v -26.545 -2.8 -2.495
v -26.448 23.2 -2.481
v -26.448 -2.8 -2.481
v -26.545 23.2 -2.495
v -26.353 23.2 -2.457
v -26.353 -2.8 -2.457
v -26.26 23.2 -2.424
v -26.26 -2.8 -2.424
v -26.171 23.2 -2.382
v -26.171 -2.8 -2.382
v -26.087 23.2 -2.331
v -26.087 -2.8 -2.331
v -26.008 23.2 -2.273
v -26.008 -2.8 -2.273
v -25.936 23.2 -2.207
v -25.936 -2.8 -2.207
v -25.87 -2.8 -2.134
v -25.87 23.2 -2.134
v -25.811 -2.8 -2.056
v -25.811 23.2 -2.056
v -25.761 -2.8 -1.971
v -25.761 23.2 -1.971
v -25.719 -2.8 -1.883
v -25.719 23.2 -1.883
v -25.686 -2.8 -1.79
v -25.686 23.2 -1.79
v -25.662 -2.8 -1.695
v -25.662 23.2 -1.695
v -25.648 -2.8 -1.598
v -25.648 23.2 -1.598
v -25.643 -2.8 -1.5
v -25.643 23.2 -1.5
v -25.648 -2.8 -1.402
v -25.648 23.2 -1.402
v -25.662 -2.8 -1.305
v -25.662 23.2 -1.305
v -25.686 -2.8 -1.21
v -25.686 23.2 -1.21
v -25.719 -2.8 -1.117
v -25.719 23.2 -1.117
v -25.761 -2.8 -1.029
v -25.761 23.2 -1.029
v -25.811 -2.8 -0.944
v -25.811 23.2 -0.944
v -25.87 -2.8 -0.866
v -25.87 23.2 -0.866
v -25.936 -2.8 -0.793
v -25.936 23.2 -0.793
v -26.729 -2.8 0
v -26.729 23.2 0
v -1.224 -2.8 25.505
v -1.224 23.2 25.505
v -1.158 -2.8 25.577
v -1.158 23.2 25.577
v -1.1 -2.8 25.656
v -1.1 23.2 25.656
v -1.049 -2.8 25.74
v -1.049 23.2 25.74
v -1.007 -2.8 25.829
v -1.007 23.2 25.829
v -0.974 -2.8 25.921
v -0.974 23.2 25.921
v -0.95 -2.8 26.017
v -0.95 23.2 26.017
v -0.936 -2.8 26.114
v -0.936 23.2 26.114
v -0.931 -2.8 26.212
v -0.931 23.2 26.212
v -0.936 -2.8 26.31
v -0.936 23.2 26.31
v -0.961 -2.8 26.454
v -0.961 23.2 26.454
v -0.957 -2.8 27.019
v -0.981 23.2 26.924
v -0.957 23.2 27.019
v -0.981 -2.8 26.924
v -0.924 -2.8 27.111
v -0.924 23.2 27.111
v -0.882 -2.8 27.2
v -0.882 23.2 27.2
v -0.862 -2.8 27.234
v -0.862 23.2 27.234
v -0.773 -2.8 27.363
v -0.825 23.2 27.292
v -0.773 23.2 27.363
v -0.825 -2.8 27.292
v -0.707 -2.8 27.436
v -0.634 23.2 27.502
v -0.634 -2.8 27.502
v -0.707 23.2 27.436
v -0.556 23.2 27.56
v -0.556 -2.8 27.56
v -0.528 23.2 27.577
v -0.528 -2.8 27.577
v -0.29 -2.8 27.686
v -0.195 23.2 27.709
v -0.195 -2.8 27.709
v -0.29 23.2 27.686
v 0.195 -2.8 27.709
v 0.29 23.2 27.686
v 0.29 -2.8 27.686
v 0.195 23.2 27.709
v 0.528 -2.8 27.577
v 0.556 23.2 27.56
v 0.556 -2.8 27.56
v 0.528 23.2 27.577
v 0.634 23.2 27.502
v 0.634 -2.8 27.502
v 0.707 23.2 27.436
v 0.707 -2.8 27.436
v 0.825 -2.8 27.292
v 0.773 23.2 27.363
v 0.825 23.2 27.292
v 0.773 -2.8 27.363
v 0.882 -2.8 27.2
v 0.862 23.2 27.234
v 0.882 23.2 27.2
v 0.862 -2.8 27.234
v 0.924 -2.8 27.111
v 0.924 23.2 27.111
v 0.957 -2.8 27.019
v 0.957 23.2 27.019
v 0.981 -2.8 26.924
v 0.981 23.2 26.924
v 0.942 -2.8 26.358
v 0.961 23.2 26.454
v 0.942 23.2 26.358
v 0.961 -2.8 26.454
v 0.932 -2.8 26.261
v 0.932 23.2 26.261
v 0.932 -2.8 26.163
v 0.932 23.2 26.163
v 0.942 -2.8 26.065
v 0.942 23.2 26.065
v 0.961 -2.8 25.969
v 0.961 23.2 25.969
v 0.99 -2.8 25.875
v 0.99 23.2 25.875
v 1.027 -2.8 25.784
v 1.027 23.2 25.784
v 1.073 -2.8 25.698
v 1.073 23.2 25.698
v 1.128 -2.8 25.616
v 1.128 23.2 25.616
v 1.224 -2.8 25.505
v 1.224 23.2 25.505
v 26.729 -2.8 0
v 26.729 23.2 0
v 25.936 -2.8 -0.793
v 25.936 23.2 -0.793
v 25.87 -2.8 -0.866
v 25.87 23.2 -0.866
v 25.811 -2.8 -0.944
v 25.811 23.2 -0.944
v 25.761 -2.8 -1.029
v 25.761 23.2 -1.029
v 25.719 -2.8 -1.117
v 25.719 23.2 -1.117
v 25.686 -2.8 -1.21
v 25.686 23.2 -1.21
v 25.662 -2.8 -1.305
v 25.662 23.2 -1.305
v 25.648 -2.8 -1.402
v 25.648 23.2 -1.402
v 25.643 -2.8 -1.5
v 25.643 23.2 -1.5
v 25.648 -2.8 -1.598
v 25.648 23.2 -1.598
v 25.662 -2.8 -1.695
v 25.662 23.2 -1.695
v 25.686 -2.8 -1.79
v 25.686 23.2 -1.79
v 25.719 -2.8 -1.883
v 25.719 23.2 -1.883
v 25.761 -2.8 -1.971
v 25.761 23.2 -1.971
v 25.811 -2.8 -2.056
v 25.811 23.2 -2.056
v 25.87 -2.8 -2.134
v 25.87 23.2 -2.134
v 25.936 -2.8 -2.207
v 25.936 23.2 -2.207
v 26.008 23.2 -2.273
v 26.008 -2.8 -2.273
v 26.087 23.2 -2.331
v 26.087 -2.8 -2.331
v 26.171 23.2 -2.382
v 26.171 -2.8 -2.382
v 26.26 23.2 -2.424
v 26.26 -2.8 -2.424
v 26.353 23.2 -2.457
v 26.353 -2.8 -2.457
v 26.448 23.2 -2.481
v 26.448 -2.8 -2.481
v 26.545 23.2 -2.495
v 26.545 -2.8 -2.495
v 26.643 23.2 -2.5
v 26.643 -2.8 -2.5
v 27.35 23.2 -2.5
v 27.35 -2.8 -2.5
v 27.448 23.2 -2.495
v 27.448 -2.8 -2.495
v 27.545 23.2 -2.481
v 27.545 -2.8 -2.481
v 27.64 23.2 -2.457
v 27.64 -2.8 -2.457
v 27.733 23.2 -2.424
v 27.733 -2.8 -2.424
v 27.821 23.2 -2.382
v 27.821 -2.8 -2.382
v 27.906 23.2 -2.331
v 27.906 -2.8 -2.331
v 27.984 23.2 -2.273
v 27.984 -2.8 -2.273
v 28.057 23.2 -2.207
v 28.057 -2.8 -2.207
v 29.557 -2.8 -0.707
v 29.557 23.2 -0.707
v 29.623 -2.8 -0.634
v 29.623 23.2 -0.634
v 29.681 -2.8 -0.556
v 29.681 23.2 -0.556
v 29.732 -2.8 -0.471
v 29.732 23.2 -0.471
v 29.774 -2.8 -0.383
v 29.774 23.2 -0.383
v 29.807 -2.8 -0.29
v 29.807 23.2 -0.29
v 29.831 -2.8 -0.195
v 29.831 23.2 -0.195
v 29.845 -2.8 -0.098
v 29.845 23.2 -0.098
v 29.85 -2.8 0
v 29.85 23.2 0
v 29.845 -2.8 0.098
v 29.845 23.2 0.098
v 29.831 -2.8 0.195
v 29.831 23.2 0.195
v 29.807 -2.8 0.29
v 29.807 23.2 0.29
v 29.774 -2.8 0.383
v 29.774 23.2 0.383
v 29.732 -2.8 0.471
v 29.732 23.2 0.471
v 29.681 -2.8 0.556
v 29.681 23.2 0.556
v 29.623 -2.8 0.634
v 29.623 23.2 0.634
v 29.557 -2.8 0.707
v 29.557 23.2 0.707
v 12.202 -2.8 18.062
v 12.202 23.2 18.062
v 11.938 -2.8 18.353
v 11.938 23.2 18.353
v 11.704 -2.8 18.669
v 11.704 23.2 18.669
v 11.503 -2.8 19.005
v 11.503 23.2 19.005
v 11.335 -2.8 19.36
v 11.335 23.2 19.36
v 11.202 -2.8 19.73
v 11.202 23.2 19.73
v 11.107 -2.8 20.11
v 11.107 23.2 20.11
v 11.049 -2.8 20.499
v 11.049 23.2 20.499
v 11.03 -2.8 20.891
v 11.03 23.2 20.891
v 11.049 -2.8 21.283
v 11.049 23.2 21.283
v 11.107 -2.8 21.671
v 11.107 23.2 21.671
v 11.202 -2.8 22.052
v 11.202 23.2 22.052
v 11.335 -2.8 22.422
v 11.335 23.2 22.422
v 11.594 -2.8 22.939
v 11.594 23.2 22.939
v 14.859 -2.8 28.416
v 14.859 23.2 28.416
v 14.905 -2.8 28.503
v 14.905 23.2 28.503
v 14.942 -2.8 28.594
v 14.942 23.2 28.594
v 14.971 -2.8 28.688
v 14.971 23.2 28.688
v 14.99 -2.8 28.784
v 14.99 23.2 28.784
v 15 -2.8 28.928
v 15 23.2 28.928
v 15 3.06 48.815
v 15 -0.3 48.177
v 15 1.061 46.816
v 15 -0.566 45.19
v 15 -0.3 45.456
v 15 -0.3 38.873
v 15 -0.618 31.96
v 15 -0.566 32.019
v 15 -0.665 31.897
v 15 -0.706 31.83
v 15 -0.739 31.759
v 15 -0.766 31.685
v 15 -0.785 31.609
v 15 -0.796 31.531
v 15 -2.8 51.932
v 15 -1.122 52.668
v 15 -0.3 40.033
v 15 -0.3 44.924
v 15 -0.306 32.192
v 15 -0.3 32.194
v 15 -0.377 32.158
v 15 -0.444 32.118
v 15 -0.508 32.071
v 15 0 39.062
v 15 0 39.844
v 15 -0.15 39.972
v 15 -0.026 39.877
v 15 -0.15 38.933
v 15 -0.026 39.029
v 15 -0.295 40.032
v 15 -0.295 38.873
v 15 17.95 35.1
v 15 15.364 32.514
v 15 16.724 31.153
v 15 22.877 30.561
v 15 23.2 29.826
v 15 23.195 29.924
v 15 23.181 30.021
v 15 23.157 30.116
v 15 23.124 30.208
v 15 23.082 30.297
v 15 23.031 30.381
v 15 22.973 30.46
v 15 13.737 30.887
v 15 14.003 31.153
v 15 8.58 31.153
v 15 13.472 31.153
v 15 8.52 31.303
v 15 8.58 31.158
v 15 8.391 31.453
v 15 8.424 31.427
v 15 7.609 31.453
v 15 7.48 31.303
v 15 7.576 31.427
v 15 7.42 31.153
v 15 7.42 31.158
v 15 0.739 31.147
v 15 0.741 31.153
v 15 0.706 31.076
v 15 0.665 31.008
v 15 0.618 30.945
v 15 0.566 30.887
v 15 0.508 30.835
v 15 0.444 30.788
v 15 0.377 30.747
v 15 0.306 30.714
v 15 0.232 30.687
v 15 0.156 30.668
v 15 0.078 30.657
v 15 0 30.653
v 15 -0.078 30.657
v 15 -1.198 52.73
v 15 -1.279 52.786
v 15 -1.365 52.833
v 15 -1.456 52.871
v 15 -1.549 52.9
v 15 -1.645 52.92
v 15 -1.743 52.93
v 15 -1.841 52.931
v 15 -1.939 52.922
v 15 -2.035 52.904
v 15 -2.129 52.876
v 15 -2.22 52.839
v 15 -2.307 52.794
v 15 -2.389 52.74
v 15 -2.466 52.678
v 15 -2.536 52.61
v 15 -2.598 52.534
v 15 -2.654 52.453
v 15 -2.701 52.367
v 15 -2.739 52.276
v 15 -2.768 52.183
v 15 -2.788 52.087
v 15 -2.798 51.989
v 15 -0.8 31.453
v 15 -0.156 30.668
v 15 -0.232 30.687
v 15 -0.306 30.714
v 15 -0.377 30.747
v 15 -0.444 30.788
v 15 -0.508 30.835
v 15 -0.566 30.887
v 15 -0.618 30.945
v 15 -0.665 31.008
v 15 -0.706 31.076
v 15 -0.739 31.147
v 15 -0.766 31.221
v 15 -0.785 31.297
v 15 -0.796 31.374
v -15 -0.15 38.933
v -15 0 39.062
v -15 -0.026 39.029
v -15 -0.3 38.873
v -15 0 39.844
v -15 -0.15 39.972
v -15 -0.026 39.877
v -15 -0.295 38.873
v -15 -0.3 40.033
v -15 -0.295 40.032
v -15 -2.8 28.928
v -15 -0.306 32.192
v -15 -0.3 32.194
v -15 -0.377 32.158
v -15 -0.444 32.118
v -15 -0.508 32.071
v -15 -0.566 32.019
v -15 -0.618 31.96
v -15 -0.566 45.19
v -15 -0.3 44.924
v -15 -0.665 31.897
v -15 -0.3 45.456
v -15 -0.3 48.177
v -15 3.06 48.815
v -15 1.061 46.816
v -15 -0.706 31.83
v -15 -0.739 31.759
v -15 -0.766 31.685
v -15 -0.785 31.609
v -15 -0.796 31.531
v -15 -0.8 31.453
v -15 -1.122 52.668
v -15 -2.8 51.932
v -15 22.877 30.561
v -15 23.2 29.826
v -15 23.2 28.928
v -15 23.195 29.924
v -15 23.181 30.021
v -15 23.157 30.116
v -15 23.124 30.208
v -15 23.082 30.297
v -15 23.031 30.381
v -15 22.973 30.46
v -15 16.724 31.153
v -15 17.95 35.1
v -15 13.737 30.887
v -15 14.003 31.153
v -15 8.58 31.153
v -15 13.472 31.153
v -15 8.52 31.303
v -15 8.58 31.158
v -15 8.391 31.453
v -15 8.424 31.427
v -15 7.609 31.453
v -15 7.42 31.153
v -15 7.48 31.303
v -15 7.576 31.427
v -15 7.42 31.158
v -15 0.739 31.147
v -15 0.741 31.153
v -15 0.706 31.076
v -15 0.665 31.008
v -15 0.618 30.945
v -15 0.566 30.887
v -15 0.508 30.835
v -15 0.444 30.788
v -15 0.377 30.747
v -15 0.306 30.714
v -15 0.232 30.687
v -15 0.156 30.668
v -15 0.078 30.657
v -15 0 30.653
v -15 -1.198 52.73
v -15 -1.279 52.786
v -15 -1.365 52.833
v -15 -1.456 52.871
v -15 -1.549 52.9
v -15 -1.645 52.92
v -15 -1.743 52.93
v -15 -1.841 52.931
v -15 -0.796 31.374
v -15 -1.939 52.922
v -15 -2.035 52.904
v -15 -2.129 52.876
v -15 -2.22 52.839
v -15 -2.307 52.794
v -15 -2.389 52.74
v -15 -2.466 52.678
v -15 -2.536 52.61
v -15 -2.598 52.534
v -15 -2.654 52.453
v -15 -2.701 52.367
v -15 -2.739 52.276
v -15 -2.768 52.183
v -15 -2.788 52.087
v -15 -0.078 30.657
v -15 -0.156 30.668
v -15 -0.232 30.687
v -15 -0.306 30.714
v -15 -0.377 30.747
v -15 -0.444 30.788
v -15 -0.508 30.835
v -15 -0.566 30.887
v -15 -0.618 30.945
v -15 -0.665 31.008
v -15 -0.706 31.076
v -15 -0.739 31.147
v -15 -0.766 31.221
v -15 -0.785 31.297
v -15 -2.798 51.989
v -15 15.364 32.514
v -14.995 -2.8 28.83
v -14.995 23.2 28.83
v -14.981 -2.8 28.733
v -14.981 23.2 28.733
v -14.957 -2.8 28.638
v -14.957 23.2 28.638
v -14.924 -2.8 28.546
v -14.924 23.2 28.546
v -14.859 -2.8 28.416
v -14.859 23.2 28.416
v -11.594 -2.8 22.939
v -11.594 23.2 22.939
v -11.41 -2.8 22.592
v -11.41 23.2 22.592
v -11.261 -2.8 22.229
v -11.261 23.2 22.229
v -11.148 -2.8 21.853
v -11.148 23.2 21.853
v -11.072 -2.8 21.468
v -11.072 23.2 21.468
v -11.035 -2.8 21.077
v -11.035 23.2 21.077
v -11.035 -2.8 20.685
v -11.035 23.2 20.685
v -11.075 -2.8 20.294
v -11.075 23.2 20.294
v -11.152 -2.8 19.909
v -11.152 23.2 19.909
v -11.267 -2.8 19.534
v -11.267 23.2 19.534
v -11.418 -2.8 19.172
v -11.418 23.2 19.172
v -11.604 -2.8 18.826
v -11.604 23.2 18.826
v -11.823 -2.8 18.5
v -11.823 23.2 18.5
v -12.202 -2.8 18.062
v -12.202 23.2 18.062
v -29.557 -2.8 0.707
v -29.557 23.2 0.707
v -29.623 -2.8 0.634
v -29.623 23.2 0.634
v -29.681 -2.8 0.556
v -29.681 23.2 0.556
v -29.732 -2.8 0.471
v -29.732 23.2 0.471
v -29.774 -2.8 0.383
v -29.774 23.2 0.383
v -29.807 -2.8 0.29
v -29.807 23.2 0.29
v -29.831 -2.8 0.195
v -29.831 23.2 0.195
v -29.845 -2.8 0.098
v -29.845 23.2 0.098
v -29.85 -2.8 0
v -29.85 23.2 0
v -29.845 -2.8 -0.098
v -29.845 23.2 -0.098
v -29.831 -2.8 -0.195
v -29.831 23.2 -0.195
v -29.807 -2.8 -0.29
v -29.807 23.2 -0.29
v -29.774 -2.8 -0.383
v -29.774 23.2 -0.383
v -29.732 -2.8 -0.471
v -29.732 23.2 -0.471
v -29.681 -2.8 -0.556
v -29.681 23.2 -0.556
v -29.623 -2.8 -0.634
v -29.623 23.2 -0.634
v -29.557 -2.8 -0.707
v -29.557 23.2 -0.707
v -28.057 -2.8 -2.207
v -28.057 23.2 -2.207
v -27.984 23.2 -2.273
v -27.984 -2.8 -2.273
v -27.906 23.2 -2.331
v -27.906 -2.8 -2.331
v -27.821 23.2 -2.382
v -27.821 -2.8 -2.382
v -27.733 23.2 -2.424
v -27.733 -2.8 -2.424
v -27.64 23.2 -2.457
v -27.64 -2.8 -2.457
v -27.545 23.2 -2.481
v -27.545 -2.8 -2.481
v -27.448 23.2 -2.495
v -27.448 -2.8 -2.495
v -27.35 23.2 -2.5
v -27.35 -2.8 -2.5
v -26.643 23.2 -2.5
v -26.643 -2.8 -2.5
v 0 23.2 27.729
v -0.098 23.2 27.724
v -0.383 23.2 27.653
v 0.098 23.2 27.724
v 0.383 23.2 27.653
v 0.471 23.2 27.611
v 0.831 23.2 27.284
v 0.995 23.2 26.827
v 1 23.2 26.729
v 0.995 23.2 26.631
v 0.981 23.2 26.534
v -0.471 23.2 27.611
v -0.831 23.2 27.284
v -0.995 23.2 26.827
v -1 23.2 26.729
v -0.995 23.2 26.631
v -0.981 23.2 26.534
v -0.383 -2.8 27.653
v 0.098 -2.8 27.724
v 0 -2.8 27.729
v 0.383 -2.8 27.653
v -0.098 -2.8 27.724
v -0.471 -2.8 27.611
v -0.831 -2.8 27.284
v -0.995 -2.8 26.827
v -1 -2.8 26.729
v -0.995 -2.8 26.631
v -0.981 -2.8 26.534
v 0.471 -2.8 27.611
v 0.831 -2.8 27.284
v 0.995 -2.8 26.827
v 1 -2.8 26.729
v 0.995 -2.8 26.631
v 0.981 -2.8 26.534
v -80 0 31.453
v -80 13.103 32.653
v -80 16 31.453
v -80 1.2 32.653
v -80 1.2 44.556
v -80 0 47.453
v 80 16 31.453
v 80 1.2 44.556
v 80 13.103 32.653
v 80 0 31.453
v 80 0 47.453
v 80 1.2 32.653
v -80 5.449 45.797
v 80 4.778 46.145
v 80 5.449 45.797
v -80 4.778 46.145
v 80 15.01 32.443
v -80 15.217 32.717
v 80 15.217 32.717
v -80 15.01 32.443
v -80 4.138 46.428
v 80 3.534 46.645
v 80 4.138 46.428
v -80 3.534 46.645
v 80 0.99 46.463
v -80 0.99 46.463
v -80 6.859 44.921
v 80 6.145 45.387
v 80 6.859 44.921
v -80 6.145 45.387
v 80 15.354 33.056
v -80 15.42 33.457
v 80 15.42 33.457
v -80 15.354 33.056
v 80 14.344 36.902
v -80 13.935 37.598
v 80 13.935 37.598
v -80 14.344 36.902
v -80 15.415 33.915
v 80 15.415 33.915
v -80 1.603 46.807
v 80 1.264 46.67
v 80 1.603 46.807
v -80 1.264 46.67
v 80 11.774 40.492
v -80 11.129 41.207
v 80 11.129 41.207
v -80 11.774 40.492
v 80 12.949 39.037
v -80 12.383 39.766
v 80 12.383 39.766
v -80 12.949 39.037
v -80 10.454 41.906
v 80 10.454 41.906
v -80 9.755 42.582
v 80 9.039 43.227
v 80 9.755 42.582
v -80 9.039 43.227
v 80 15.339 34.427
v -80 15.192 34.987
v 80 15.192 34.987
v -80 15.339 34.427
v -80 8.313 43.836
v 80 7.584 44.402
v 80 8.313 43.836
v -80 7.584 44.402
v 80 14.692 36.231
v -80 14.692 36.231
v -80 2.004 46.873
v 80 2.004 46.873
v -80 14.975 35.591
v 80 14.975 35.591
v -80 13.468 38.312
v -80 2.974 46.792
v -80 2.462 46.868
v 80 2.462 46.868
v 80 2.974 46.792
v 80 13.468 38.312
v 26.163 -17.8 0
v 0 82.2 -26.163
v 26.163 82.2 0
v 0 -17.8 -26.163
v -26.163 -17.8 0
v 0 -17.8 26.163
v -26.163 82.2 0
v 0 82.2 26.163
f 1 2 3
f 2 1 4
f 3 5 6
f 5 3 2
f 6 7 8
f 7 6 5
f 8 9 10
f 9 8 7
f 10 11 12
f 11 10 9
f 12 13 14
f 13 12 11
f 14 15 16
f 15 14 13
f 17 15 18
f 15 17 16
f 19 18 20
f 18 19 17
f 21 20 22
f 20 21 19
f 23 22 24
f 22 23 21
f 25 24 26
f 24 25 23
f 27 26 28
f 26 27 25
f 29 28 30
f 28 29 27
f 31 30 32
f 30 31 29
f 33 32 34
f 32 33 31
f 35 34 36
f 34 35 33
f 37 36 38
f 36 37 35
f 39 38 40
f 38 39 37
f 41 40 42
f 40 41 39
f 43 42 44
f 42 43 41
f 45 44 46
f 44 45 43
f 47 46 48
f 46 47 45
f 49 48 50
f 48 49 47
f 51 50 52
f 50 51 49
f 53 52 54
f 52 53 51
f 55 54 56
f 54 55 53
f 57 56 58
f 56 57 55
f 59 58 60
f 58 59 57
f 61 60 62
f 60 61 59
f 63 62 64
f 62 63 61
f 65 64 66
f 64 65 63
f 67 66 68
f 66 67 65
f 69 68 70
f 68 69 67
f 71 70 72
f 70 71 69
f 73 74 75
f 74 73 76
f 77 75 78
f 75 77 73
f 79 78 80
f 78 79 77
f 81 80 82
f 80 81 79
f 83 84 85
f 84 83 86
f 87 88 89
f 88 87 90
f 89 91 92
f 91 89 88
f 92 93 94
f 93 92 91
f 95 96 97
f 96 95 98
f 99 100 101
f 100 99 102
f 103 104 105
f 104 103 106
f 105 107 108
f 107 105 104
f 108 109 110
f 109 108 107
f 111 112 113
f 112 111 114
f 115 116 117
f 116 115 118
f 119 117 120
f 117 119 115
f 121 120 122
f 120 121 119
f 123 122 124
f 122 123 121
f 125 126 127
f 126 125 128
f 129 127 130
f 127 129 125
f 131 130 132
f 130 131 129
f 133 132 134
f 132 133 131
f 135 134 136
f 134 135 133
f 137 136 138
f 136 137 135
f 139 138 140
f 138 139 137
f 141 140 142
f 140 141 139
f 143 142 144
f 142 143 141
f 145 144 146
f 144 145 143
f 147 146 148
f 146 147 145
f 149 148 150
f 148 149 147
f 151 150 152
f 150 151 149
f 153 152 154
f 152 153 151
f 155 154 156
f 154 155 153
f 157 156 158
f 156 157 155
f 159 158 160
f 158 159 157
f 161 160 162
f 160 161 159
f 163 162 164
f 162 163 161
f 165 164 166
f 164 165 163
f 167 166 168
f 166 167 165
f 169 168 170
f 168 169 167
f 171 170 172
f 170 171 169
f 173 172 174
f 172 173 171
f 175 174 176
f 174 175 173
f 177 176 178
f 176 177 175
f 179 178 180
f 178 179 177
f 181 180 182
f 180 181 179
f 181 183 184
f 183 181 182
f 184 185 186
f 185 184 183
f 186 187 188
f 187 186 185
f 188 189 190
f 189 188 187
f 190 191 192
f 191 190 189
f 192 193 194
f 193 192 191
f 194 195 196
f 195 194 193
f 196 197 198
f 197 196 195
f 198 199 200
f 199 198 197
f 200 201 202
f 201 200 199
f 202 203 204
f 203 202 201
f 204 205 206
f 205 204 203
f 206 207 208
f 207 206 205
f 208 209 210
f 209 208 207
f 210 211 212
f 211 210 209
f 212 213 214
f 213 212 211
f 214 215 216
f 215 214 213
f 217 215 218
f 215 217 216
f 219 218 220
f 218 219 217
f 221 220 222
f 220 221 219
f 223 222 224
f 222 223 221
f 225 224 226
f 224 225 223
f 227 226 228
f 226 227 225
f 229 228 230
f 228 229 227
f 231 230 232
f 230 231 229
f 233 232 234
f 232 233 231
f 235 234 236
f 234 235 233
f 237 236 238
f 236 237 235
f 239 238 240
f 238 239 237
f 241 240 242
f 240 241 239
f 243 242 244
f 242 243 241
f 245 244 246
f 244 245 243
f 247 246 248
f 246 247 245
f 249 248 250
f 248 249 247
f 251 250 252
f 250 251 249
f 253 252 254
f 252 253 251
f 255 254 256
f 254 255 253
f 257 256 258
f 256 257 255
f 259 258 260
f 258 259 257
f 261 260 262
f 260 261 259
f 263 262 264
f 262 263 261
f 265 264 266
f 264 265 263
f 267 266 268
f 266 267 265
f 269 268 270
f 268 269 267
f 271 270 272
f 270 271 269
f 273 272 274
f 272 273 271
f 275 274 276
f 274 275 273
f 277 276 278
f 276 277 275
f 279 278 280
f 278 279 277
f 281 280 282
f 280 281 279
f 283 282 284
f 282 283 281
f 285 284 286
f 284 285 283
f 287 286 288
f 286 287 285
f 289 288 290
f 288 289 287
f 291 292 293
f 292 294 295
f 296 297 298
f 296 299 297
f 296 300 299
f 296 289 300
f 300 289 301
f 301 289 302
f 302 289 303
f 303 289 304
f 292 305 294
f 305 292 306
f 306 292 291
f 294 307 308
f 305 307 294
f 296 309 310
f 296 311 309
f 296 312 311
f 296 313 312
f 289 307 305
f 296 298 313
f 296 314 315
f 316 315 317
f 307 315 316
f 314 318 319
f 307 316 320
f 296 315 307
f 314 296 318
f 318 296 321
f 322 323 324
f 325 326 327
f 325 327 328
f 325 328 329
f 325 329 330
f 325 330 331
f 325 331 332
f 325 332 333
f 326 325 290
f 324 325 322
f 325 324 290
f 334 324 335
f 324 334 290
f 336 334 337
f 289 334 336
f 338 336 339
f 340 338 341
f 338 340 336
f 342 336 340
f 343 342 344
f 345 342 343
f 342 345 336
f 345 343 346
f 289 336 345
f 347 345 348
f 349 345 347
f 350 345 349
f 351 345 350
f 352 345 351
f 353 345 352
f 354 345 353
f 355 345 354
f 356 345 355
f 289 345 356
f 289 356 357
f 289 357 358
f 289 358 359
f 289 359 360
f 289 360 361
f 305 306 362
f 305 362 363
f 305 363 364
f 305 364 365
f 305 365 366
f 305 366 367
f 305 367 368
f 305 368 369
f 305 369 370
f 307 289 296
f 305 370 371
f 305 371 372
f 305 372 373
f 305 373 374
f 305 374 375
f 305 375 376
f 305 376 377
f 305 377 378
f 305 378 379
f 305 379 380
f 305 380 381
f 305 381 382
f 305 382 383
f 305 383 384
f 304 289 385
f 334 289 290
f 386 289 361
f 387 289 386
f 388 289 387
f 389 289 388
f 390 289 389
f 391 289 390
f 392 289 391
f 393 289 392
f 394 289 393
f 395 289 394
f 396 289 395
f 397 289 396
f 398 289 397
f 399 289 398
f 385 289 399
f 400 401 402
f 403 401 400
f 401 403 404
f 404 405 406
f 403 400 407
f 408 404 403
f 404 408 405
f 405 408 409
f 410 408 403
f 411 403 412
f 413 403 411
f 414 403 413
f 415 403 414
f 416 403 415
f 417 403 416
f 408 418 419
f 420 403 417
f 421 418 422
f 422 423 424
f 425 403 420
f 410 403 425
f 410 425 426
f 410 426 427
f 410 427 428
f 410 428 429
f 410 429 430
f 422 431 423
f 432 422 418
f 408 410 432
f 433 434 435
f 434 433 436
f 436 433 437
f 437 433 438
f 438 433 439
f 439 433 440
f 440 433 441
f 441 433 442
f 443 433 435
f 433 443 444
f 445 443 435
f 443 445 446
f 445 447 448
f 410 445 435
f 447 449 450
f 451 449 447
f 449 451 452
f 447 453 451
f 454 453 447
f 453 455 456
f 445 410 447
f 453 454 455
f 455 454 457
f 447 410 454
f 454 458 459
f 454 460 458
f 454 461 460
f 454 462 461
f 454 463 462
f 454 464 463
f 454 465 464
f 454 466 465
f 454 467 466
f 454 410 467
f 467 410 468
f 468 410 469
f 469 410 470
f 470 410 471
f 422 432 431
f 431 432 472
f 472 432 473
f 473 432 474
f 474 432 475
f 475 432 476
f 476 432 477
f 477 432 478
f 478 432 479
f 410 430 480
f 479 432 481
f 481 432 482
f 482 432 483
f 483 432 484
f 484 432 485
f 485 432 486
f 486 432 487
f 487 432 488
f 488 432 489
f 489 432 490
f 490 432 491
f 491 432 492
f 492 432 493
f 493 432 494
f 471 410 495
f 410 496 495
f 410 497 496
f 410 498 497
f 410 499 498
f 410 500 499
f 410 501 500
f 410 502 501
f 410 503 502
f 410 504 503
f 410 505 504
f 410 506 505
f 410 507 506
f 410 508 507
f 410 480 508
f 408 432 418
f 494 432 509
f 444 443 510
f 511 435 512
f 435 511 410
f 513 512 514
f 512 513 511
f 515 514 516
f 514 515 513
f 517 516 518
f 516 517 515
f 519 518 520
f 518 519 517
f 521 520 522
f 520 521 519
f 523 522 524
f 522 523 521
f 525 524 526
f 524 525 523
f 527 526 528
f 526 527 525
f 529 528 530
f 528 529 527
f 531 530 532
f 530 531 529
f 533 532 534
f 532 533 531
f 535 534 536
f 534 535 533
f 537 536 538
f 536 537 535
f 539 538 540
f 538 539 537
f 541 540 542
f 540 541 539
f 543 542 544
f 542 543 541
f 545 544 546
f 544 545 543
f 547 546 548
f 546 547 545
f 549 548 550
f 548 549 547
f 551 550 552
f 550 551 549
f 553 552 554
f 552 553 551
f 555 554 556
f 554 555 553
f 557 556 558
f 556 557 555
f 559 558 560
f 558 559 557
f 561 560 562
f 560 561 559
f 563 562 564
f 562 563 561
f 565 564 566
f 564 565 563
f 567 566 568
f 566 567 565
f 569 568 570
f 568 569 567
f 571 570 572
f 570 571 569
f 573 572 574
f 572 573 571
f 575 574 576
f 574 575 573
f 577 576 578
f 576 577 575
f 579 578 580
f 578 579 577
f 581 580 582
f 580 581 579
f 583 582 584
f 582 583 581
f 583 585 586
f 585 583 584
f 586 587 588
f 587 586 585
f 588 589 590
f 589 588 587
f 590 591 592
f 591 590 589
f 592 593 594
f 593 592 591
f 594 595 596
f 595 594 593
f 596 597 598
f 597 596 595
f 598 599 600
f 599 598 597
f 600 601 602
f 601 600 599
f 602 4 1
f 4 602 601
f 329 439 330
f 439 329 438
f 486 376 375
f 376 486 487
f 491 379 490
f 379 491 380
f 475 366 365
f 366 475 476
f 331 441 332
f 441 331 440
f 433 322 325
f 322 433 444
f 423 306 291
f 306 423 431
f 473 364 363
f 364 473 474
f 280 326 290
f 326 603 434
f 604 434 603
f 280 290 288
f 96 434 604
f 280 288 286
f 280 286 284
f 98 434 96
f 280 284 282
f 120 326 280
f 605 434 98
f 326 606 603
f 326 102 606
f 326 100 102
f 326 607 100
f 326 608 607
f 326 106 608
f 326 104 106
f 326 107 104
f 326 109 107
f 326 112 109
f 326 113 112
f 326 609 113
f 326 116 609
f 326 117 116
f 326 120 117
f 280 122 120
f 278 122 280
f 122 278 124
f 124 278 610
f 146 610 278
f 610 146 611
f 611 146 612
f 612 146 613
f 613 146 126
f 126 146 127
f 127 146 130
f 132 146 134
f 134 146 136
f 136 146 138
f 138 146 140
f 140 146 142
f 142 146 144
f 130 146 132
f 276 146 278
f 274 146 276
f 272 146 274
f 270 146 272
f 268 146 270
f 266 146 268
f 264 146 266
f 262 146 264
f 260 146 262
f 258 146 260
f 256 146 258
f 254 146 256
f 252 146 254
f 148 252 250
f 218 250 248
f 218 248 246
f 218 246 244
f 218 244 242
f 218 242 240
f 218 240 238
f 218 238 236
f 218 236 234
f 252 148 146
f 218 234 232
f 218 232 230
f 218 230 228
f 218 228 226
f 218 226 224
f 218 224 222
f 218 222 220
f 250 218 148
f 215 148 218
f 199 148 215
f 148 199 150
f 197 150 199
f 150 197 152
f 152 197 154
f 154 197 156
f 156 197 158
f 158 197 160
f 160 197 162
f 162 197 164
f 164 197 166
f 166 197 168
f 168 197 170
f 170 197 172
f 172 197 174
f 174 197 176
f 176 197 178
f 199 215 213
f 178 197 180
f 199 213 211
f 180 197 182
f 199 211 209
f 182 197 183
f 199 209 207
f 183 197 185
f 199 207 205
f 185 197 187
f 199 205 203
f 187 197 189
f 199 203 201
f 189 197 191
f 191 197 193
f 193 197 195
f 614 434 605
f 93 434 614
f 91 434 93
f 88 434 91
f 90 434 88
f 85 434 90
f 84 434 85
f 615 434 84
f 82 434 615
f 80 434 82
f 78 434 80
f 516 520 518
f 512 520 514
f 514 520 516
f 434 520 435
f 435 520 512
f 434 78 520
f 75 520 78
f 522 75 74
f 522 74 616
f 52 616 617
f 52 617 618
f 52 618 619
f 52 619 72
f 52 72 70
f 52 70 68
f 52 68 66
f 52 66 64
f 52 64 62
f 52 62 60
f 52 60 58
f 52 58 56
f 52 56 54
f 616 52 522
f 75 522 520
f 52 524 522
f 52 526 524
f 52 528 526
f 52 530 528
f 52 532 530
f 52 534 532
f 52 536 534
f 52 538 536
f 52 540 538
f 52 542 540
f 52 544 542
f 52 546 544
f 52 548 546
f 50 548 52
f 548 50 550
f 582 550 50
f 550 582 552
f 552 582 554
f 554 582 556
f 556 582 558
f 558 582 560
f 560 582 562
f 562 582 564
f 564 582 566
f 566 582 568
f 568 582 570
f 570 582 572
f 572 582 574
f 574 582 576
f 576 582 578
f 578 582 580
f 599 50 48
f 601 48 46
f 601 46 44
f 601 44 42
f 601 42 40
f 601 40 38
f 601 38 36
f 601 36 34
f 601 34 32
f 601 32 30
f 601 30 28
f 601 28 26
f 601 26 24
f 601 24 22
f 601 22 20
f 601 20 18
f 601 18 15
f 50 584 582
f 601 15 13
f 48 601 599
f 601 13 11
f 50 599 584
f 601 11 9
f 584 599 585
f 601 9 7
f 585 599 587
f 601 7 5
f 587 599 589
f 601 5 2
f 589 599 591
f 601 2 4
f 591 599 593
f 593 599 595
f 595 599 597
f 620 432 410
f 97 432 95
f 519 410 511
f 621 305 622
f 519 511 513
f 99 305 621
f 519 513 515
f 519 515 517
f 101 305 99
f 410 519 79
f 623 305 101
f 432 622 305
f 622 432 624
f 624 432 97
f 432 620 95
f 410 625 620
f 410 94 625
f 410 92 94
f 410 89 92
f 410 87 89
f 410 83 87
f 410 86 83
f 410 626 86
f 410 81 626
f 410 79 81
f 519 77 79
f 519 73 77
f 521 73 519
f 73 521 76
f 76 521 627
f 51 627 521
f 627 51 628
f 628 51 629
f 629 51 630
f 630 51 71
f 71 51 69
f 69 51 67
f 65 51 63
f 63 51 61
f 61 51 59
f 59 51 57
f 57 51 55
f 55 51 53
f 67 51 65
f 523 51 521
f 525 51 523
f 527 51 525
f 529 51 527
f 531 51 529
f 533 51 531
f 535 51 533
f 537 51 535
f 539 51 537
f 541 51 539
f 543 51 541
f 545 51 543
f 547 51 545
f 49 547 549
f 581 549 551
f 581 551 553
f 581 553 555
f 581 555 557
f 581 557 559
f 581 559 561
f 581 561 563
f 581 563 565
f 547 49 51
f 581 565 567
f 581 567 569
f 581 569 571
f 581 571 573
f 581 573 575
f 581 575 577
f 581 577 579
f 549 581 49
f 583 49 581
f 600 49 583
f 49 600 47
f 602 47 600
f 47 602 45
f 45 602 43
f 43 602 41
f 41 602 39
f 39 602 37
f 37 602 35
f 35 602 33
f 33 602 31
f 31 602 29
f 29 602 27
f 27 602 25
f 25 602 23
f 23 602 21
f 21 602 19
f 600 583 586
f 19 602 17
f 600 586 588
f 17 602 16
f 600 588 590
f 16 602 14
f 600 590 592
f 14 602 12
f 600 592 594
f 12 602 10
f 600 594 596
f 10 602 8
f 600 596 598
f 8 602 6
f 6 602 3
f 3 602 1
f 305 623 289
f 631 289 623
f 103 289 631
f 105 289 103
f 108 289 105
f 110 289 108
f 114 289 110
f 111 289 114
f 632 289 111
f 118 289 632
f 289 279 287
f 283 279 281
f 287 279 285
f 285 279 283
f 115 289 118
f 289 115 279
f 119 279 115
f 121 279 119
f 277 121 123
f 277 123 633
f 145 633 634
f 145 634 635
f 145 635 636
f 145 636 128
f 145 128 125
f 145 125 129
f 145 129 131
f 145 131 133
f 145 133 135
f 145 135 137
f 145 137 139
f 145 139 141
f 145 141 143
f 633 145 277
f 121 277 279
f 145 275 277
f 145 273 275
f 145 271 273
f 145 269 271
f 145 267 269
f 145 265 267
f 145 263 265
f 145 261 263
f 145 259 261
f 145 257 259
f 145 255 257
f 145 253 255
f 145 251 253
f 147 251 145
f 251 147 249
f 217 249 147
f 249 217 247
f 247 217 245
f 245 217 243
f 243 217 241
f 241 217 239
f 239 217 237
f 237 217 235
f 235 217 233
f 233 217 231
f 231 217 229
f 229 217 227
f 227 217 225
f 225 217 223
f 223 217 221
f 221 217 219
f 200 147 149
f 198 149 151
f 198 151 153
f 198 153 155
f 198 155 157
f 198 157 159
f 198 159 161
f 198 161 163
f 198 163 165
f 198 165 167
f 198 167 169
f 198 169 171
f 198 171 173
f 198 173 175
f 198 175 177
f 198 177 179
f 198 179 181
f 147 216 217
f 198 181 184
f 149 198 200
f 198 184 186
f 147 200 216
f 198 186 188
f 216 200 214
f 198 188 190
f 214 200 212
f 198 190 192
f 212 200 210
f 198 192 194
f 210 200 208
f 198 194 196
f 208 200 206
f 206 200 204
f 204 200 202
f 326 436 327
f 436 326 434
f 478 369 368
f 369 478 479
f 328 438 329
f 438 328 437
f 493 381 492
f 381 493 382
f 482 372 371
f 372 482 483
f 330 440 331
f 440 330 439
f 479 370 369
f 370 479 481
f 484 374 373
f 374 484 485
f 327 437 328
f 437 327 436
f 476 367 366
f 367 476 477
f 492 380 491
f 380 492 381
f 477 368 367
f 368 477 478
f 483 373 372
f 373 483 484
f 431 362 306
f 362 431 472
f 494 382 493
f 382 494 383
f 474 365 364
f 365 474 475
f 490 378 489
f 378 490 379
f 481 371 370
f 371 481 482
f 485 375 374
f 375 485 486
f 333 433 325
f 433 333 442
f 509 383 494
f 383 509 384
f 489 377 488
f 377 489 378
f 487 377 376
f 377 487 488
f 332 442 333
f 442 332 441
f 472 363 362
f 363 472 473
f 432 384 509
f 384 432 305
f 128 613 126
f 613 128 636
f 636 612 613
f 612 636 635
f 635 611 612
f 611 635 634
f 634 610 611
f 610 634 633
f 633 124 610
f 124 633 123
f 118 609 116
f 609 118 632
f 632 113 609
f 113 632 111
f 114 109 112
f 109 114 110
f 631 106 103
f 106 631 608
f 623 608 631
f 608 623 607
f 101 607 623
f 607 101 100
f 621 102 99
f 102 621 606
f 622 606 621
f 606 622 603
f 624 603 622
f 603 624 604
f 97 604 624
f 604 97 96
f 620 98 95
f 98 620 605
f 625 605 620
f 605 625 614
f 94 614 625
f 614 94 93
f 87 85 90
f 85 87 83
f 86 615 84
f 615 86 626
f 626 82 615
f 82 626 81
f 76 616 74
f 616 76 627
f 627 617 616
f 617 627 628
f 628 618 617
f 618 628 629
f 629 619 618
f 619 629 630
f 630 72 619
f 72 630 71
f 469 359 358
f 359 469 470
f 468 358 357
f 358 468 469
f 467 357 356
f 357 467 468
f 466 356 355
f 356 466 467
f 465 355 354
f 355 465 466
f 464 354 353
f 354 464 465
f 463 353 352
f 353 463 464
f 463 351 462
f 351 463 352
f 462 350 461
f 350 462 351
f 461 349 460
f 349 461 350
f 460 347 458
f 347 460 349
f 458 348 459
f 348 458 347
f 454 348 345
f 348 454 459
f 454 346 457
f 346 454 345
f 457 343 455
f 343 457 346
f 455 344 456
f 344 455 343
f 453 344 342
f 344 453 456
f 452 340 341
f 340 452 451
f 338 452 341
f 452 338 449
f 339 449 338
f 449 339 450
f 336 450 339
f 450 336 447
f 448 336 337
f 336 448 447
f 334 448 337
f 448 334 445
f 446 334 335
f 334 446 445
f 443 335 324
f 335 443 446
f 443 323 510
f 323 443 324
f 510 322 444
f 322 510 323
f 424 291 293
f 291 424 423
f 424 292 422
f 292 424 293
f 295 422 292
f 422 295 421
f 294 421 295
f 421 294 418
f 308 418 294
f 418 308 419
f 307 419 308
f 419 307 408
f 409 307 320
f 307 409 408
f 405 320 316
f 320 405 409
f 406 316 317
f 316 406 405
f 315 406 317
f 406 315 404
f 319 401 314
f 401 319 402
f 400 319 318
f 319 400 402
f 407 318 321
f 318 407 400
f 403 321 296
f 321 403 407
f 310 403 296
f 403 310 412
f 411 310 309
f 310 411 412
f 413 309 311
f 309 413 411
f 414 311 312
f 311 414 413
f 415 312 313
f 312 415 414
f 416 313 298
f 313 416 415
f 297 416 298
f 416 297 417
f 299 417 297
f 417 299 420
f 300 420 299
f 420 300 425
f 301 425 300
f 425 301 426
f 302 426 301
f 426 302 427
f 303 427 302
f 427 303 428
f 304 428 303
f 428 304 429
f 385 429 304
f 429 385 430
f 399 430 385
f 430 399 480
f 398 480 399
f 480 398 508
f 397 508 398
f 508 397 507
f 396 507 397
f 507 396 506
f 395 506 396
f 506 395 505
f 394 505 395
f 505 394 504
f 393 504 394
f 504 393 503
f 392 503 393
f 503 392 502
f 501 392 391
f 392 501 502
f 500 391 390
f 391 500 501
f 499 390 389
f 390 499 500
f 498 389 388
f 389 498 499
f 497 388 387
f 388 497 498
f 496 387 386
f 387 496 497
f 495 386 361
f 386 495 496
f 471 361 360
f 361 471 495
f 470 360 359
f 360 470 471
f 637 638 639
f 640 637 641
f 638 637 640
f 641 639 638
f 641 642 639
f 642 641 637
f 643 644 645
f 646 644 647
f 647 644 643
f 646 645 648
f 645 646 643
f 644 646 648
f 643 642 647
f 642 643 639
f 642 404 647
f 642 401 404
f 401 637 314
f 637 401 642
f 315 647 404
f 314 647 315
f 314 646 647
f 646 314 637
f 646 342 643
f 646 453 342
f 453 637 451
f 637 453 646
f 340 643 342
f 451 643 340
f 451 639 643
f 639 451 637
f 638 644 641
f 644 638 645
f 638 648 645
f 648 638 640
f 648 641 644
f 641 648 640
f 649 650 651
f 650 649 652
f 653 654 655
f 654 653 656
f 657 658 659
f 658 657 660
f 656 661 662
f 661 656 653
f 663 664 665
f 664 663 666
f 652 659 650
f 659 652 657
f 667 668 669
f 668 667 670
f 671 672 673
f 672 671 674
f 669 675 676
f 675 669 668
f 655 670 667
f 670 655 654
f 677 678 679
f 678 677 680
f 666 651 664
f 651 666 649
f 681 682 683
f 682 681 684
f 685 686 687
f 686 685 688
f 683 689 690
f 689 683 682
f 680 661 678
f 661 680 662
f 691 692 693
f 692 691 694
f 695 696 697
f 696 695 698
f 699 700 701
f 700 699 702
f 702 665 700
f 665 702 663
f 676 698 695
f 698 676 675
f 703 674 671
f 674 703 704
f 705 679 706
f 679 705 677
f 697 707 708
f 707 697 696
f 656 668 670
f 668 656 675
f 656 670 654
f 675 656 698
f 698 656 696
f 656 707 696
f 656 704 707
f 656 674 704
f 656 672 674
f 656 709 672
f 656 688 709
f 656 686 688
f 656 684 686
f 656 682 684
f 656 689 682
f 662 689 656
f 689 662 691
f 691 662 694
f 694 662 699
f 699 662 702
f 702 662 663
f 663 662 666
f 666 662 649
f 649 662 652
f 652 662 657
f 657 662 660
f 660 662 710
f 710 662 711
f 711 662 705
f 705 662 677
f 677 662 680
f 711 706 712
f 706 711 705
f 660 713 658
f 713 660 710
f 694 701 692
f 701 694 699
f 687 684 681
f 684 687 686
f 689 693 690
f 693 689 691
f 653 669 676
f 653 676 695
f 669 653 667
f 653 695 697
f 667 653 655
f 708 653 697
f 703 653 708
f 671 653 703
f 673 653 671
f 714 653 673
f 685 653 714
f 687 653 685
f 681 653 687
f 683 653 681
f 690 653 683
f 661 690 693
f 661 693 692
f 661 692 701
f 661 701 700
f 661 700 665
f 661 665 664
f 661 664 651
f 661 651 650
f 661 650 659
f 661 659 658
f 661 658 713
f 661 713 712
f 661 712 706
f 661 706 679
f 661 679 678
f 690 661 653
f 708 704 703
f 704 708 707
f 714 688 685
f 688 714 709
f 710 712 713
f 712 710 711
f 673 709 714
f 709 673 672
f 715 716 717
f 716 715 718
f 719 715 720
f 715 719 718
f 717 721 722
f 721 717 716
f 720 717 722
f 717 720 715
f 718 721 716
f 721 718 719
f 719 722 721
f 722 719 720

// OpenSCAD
// =============================================================================
//  LED profile clip for diamond-set wine rack dividers
//  Snaps over a 37 mm square wooden divider that sits corner-up (rotated
//  45 deg) and carries a 16 x 16 mm aluminium corner LED profile ACROSS it,
//  so one long profile bridges several dividers behind the bottles. The
//  profile is tilted so the light shines towards the front of the rack.
//  Designed for PETG.
// =============================================================================
//
//  ASSUMPTIONS (check these against the real parts)
//  ------------------------------------------------
//  * The divider is a square 37 x 37 mm stick running front-to-back, turned
//    45 deg about its length so one corner points straight up and two point
//    sideways. The clip's saddle wraps its upper corner.
//  * The LED profile is a 90 deg CORNER profile: two flat 16 mm backs at a
//    right angle (the "V"), with the diffuser (flat, angled or half-round)
//    across the open side, where the 10 mm strip sits.
//  * `beam_angle` is the angle of the diffuser's facing direction, measured
//    from straight up towards the front of the rack. At the default 45 deg
//    the V lies as an "L": one back flat on a horizontal floor and the other
//    against a vertical back wall, with the light going out forwards and
//    upwards at 45 deg.
//  * The aluminium has a small edge where each back meets the diffuser.
//    Two lips hook over those edges by `lip_overlap`: one on top of the
//    back wall and one at the floor's front edge, so the profile slides in
//    from the end and a knock from a bottle cannot pop it out. If your
//    diffuser bulges out over the full width, lower `lip_overlap`
//    (0 = rely on the crush ribs).                                 [CHECK]
//    Printed on its back face, the front lip starts in mid-air over the
//    profile's pocket, so it needs support (see PRINT NOTES). With
//    `front_lip = false` the clip prints with no support at all, held by
//    the top lip alone.
//  * The divider is clear under its two side corners where the clip sits,
//    so the hooks can wrap `grip_depth` past them. If not, set
//    `grip_depth = 0` and the clip becomes a rest-on saddle.
//
//  COORDINATES (as fitted)
//    X = left/right along the rack (the LED profile's length)
//    Y = front/back, along the divider (+Y = towards the FRONT of the rack)
//    Z = up
//    The divider's centre line is the Y axis.
//
//  HOW TO USE
//    Set `part`, press F6, export STL.
//      "clip"     - one clip in print orientation
//      "assembly" - clip as fitted, with ghost divider and ghost profile
//      "print"    - `print_count` clips in a row, in print orientation
//    Mount: push a clip straight down over the back end of each divider in
//    the row until the hooks click under the side corners. Line them up,
//    then slide the profile through all of them from one end.
//
//  PRINT NOTES (PETG)
//    * Printed standing on its BACK face (-Y on the bed). The saddle's
//      cross-section then lies in every layer, so the hooks flex within a
//      layer (their strong direction), the back wall of the channel is on
//      the bed, and at the default 45 deg beam every overhang is 45 deg or
//      less, except the front lip. That lip's underside starts in mid-air
//      inside the channel and needs support there only: in Bambu Studio
//      paint support under it, or use the P2S project files, which carry
//      a support enforcer for exactly that spot.
//      The support stands on the back wall inside the channel and pulls
//      out along the channel. Clean the lip's underside before fitting
//      the profile.
//    * 0.2 mm layers, 4 perimeters (a solid 2.5 mm wall at 0.45 mm width),
//      25-40 % gyroid infill for the solid block under the channel.
//    * Print one first and adjust `divider_clear`, `profile_tol` and
//      `crush` until both fits feel right. Wood varies, so measure the real
//      divider rather than trusting the nominal 37 mm.
//
// =============================================================================


/* [Render] */
part        = "assembly";   // ["clip", "assembly", "print"]
print_count = 4;            // clips laid out for "print"
$fn = 64;


/* [Wooden divider] */
divider_side  = 37.0;       // square section, side length         [CHECK]
divider_clear = 0.4;        // gap between wood and saddle, per face. Wood
                            //   swells and varies, so this is looser than
                            //   the profile fit.
wood_relief_r = 1.0;        // relief along the saddle's top inside corner
                            //   so a sharp (un-eased) wood edge still seats
grip_depth    = 2.5;        // how far the hooks reach BELOW the divider's
                            //   side corners (vertical mm). More = firmer
                            //   grip but harder to push on. 0 = no hooks.


/* [LED profile] */
profile_leg  = 16.0;        // length of each flat back of the corner profile
profile_tol  = 0.3;         // sliding clearance, per face (0.25-0.3 PETG)
lip_overlap  = 1.2;         // how far the lip hooks over the profile's
                            //   upper front edge                  [CHECK]
front_lip    = true;        // lip over the floor's front edge too. Needs
                            //   support under it when printed. false =
                            //   top lip only, no support needed.
crush        = 0.15;        // crush-rib interference with the profile backs.
                            //   Ribs run along the profile, so it still
                            //   slides but stays put. 0 = no ribs.
rib_r        = 0.6;         // crush-rib radius


/* [Light direction] */
beam_angle   = 45;          // diffuser direction, degrees from straight up
                            //   towards the rack front (+Y). 0 = up,
                            //   90 = straight forward. Negative aims back.


/* [Clip body] */
wall          = 2.5;        // minimum wall everywhere (>= 2.5 for PETG)
lip_t         = 2.5;        // thickness of the retaining lips
channel_len   = 30.0;       // length of the channel along the profile (X)
saddle_depth  = 26.0;       // length of the saddle along the divider (Y).
                            //   26 covers the whole channel at 45 deg, so
                            //   the front lip has no overhang when printed
round_r       = 1.0;        // rounding of outside edges and hook tips
                            //   (must stay below wall/2)
fillet_r      = 4.0;        // fillet where the channel block meets the arms
bridge_drop   = 10.0;       // how far down the saddle faces the solid block
                            //   under the channel reaches. The arms below
                            //   stay at `wall` so they can flex.


// =============================================================================
//  Derived dimensions -- normally no need to edit below this line
// =============================================================================

s2 = sqrt(2);
cav_side = divider_side + 2*divider_clear;  // saddle cavity square
cav_h    = cav_side/2*s2;                   // cavity top corner above centre
out_h    = cav_h + wall*s2;                 // saddle outer top corner
out_w    = (cav_side + 2*wall)*s2;          // saddle width across the diamond

pa       = profile_leg/s2;                  // half hypotenuse = V depth
seat_relief_r = 0.8;                        // relief in the channel's corner

// Height of the profile's back corner (the channel's inside corner).
// At beam_angle 45 the profile's floor is flat at seat_z - profile_tol, and
// this keeps `wall` of solid over the cavity's relief cut.
seat_z   = cav_h + wood_relief_r + wall + seat_relief_r + profile_tol*s2;

// The saddle runs along Y from the back of the channel forwards. At
// beam_angle 45 this makes the channel's back wall flush with the saddle.
saddle_y0 = -(wall + profile_tol);

big = 300;                                  // "infinite" for 2D cuts

echo(str("Clip: saddle ", saddle_depth, " mm along the divider, channel ",
         channel_len, " mm along the profile, ", out_w,
         " mm wide over the hooks"));


// =============================================================================
//  Helpers
// =============================================================================

// Rounds every convex corner of a 2D shape by r.
module round_convex(r)  { offset(r = r) offset(delta = -r) children(); }

// Fills every concave corner of a 2D shape with a radius-r fillet.
module fill_concave(r)  { offset(r = -r) offset(delta = r) children(); }

// Square, rotated so one corner points up. `side` is the side length.
module diamond(side) { rotate(45) square(side, center = true); }

// 2D sketch in the FRONT view (2D x -> X, 2D y -> Z), extruded along Y.
module along_y(len, y0) {
    translate([0, y0 + len, 0]) rotate([90, 0, 0])
        linear_extrude(height = len) children();
}

// 2D sketch in the SIDE view (2D x -> Y, 2D y -> Z), extruded along X.
module along_x(len) {
    rotate([90, 0, 90]) linear_extrude(height = len, center = true) children();
}

// Places a side-view 2D sketch in the channel's frame: origin at the
// profile's back corner, V opening along the beam direction.
module at_seat() { translate([0, seat_z]) rotate(-beam_angle) children(); }


// =============================================================================
//  Side view (YZ): the channel and the saddle's depth
// =============================================================================

// Channel outline in its own frame: the V walls plus the lip band.
module seat_outer_2d() {
    top = pa + profile_tol + lip_t;
    intersection() {
        offset(delta = wall + profile_tol)
            polygon([[0, 0], [top + 10, top + 10], [-(top + 10), top + 10]]);
        translate([-big, -big]) square([2*big, big + top]);
    }
}

// What the profile needs: its triangle (+ clearance), a slot over the
// diffuser between the lips, and a small relief at the back corner.
// The +x leg is the floor for a positive beam_angle; without `front_lip`
// everything beyond the diffuser on that side is cut away, leaving the
// floor's front end as a face that points up when printed.
module seat_pocket_2d() {
    offset(delta = profile_tol)
        polygon([[0, 0], [pa, pa], [-pa, pa]]);
    translate([-(pa - lip_overlap), pa - 2]) square([2*(pa - lip_overlap), big]);
    if (!front_lip)
        translate([0, pa + profile_tol]) square([big, big]);
    circle(r = seat_relief_r);
}

// Crush ribs: half-round bumps on each back face, at mid-leg, standing
// `crush` proud of the nominal profile surface.
module crush_ribs_2d() {
    if (crush > 0)
        for (m = [-1, 1]) {
            n = [m, -1] / s2;                       // outward face normal
            p = [m*pa/2, pa/2] + n*(rib_r - crush); // rib centre
            translate(p) circle(r = rib_r, $fn = 24);
        }
}

module side_silhouette_2d() {
    round_convex(round_r) fill_concave(fillet_r) {
        // saddle band, full height, `saddle_depth` long
        translate([saddle_y0, -big]) square([saddle_depth, big + out_h]);
        // channel, blended into the top of the saddle
        hull() {
            at_seat() seat_outer_2d();
            translate([saddle_y0, out_h - bridge_drop])
                square([saddle_depth, bridge_drop]);
        }
    }
}


// =============================================================================
//  Front view (XZ): the saddle and the block under the channel
// =============================================================================

// Saddle outline (solid), cut off `grip_depth` below the side corners.
module saddle_outer_2d() {
    intersection() {
        diamond(cav_side + 2*wall);
        translate([-big, -grip_depth]) square([2*big, big]);
    }
}

module saddle_cavity_2d() {
    diamond(cav_side);
    translate([0, cav_h]) circle(r = wood_relief_r);         // top relief
    translate([-big, -big]) square([2*big, big - grip_depth]); // open below
}

module front_silhouette_2d() {
    round_convex(round_r)
        difference() {
            fill_concave(fillet_r) union() {
                saddle_outer_2d();
                hull() {
                    intersection() {
                        saddle_outer_2d();
                        translate([-big, out_h - bridge_drop])
                            square([2*big, big]);
                    }
                    translate([-channel_len/2, seat_z - profile_tol - wall])
                        square([channel_len, big]);
                }
            }
            saddle_cavity_2d();
        }
}


// =============================================================================
//  3D parts
// =============================================================================

// The body is where the front and side silhouettes overlap; then the
// divider and the profile are cut out of it.
module clip() {
    difference() {
        intersection() {
            along_y(saddle_depth + 2*big, saddle_y0 - big)
                front_silhouette_2d();
            along_x(channel_len + 2*big) side_silhouette_2d();
        }
        along_y(2*big, -big) saddle_cavity_2d();
        along_x(2*big) difference() {
            at_seat() seat_pocket_2d();
            at_seat() crush_ribs_2d();
        }
    }
}

// Print orientation: back face (-Y) on the bed.
module clip_print() {
    translate([0, 0, -saddle_y0]) rotate([90, 0, 0]) clip();
}

// Ghost divider and profile for the "assembly" view.
module ghost_divider(len) {
    color("BurlyWood", 0.45)
        translate([0, saddle_y0 - 15, 0]) rotate([-90, 0, 0])
            linear_extrude(height = len) diamond(divider_side);
}

module ghost_profile(len) {
    t = 1.2;                    // aluminium wall, for looks only
    color("Silver", 0.7)
        along_x(len) at_seat() difference() {
            polygon([[0, 0], [pa, pa], [-pa, pa]]);
            offset(delta = -t) polygon([[0, 0], [pa, pa], [-pa, pa]]);
        }
    color("WhiteSmoke", 0.6)    // diffuser
        along_x(len) at_seat() translate([0, pa]) intersection() {
            scale([1, 0.35]) circle(r = pa - lip_overlap - 0.2);
            translate([-big/2, 0]) square(big);
        }
}


if (part == "clip") {
    clip_print();
} else if (part == "assembly") {
    color("SteelBlue") clip();
    ghost_divider(100);
    ghost_profile(160);
} else if (part == "print") {
    pitch = max(out_w, channel_len) + 6;    // widest view of the clip + gap
    for (i = [0 : print_count - 1])
        translate([i*pitch, 0, 0]) clip_print();
}
